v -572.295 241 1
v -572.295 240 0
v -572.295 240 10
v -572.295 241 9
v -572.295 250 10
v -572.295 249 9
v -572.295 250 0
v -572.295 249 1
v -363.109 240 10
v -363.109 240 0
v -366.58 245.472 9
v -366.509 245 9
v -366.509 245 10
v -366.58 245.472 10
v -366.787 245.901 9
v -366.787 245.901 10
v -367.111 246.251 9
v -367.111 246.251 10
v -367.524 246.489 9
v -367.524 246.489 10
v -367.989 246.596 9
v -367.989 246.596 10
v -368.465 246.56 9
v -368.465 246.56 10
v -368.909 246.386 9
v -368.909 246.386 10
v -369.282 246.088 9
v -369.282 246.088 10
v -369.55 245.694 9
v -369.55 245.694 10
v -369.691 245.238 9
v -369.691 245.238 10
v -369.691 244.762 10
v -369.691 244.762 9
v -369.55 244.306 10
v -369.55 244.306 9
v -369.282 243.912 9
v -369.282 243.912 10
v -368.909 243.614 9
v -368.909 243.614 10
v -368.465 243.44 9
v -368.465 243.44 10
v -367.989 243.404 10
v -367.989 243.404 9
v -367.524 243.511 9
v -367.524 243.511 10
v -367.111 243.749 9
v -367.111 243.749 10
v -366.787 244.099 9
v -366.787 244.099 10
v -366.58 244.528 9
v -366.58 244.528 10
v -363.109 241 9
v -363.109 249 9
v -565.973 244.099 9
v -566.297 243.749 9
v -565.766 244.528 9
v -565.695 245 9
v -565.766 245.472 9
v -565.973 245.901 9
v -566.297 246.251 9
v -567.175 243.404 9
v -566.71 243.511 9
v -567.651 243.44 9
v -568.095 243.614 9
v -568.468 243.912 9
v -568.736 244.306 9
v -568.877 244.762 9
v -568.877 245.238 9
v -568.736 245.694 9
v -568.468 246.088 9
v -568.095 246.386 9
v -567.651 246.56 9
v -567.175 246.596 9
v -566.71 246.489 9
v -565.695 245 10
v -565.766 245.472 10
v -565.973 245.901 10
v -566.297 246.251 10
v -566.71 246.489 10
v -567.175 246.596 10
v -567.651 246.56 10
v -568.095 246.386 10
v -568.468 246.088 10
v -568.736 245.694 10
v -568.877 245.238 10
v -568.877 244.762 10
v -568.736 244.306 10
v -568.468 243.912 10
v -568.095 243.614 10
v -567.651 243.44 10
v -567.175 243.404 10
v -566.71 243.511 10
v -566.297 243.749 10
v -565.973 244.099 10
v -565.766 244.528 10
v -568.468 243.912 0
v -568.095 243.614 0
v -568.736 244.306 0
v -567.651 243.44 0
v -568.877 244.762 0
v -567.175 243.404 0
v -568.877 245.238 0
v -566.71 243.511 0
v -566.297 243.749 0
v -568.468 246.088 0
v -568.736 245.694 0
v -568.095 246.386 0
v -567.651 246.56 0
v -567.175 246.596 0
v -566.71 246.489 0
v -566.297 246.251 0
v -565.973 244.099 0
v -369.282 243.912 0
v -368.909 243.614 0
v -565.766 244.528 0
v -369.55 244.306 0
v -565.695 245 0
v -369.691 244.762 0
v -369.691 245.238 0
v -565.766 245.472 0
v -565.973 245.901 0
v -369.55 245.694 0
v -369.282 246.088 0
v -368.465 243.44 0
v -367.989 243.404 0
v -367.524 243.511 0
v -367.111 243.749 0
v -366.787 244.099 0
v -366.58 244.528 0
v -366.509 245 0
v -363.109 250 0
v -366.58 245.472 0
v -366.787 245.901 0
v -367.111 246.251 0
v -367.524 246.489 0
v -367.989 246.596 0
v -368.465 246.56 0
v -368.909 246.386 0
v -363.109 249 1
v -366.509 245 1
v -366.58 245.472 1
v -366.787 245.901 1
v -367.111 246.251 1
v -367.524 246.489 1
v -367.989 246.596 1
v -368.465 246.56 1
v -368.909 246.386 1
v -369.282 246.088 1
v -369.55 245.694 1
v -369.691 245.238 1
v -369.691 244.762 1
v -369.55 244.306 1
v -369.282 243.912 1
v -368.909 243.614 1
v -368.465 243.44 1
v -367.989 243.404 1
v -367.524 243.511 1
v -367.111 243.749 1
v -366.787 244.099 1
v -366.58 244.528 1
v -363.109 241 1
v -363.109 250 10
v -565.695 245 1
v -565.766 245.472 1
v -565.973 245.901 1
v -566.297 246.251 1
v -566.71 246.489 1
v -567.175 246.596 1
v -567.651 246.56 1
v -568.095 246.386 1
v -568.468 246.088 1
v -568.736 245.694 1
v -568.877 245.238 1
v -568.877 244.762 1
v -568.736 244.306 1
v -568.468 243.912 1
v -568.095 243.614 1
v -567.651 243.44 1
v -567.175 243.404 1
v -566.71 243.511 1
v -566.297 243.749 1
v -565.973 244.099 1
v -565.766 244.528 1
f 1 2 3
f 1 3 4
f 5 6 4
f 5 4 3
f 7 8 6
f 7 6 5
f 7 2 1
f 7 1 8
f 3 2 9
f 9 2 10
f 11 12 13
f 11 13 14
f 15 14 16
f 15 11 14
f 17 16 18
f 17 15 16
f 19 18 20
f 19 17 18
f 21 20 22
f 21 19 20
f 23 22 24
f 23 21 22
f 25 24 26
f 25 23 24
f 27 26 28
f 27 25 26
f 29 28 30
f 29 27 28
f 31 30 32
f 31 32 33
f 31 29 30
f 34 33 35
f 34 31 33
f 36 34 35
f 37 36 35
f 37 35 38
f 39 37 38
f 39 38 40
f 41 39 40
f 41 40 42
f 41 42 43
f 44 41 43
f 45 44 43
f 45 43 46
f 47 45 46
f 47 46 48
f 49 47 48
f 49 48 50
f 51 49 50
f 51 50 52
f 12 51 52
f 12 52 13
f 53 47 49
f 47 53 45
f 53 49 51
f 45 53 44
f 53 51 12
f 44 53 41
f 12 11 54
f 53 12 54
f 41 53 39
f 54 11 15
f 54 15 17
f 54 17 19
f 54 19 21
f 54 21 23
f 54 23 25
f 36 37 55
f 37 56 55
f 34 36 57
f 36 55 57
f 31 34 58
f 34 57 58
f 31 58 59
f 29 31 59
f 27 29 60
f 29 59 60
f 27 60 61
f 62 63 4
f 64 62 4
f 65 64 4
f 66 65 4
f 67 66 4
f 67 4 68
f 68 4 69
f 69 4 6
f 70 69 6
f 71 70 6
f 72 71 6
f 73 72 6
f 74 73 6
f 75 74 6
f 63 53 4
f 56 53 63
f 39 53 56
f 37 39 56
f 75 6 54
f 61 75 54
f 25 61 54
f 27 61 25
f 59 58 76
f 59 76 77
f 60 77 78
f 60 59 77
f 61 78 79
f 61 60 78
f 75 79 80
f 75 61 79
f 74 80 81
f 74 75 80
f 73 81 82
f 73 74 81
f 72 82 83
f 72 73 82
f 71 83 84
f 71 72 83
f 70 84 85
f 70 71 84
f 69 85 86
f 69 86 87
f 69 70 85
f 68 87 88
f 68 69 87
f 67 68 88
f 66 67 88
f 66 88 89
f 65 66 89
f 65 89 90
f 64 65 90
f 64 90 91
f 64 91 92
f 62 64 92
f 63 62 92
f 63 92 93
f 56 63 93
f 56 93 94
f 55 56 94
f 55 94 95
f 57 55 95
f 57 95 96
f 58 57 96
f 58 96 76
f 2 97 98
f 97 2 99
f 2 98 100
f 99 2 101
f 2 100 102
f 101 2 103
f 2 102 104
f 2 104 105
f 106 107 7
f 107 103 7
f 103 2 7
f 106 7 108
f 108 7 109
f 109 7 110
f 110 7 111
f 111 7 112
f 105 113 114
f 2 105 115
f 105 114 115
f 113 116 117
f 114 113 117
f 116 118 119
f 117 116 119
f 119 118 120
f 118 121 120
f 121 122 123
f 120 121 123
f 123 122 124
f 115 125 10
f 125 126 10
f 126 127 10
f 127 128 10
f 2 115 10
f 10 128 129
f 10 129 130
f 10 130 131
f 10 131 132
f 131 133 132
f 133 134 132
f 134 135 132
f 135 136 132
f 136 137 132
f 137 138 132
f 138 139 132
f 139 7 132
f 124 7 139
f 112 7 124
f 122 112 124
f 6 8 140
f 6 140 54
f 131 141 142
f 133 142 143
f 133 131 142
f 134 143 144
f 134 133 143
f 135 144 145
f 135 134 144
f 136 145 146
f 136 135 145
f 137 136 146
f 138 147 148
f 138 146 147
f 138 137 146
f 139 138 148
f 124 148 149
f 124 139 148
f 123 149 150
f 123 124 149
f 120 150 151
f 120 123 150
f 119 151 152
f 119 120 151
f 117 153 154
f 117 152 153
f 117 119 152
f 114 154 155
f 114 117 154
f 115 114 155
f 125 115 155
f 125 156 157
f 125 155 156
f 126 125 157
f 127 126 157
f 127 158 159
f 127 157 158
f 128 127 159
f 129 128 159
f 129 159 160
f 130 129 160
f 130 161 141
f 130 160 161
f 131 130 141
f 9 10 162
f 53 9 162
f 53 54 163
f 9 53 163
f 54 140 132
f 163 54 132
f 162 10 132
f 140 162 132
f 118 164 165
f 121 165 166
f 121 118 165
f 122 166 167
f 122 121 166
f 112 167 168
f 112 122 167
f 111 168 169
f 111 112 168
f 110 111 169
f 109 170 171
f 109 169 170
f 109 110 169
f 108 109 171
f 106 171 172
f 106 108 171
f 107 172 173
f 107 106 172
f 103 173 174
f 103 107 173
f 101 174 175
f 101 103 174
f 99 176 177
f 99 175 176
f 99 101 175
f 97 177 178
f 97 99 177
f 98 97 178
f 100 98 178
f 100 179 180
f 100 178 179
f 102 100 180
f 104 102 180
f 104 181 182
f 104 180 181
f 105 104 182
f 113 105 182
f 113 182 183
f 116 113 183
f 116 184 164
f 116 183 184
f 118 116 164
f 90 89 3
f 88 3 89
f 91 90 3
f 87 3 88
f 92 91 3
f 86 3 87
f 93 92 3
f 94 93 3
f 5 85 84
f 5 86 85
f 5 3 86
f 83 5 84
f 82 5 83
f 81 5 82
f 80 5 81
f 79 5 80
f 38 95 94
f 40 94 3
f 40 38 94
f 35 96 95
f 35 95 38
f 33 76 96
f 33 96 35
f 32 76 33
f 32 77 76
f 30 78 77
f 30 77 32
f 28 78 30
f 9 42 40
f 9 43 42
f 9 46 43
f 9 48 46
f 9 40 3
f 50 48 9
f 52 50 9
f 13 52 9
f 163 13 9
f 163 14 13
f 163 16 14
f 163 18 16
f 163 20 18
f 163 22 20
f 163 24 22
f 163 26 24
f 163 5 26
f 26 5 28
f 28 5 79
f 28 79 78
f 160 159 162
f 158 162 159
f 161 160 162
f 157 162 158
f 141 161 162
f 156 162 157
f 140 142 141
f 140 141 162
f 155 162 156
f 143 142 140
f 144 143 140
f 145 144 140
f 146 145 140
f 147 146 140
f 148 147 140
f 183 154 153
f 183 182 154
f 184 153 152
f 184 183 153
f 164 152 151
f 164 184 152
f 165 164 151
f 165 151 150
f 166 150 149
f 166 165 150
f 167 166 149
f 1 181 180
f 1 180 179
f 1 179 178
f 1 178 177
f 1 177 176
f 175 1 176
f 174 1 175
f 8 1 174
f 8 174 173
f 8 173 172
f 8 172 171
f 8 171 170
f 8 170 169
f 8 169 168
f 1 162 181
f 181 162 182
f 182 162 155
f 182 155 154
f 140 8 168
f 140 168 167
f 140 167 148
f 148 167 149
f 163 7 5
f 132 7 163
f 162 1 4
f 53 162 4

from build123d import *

# Parameters (mm, degrees)
SKETCH_1_W          = 209.185842875
SKETCH_1_H          = 10
SKETCH_1_R          = 1.6
EXTRUDE_1_DEPTH     = 10
SKETCH_2_W          = 8
SKETCH_2_H          = 8
CUT_EXTRUDE_1_DEPTH = 327.126841673


with BuildPart() as part:
    # ｽｹｯﾁ1 → ﾎﾞｽ - 押し出し1 (new body)
    with BuildSketch(Plane.XY):
        with Locations((-467.701812763, 245)):
            Rectangle(SKETCH_1_W, SKETCH_1_H)
        with Locations((-368.108891325, 245)):
            Circle(SKETCH_1_R, mode=Mode.SUBTRACT)
        with Locations((-567.2947342, 244.999999998)):
            Circle(SKETCH_1_R, mode=Mode.SUBTRACT)
    extrude(amount=EXTRUDE_1_DEPTH)

    # ｽｹｯﾁ2 → ｶｯﾄ - 押し出し1 (cut, through all)
    with BuildSketch(Plane.ZY.offset(572.2947342)):
        with Locations((5, 245)):
            Rectangle(SKETCH_2_W, SKETCH_2_H)
    extrude(amount=-CUT_EXTRUDE_1_DEPTH, mode=Mode.SUBTRACT)


solid = part.part
